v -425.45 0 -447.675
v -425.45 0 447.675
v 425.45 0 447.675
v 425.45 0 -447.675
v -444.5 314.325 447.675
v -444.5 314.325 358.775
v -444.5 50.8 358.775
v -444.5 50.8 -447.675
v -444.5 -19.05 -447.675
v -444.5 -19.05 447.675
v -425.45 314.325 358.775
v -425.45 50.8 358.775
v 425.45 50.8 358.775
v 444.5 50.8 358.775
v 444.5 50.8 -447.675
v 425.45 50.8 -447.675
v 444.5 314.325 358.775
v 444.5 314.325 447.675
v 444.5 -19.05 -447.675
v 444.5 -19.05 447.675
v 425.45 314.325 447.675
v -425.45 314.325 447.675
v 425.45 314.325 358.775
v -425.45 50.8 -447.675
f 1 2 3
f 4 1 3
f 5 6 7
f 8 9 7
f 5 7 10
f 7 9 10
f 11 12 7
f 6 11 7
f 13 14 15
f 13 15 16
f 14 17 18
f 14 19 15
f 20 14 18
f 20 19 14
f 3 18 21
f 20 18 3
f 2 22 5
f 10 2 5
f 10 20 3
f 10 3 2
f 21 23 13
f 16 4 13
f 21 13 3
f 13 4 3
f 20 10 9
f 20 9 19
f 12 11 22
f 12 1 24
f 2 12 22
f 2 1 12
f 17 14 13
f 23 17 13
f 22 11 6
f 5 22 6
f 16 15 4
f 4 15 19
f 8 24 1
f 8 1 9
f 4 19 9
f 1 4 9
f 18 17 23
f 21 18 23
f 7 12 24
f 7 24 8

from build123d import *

# Parameters (mm, degrees)
F0_W     = 889
F0_H     = 895.35
F1_DEPTH = 19.05
F2_W     = 19.05
F2_H     = 895.35
F3_DEPTH = 50.8
F4_W     = 19.05
F4_H     = 88.9
F5_DEPTH = 263.525
F6_W     = 19.05
F6_H     = 88.9
F7_DEPTH = 263.525


with BuildPart() as f1:
    # F0 (on Front) → F1 (new body)
    with BuildSketch(Plane.XZ):
        Rectangle(F0_W, F0_H)
    extrude(amount=F1_DEPTH)

    # F2 (on face) → F3 (join)
    with BuildSketch(Plane(origin=(0, 0, 0), x_dir=(-1, 0, 0), z_dir=(0, 1, 0))):
        with Locations((-434.975, 0)):
            Rectangle(F2_W, F2_H)
        with Locations((434.975, 0)):
            Rectangle(F2_W, F2_H)
    extrude(amount=F3_DEPTH)

    # F4 (on face) → F5 (join)
    with BuildSketch(Plane(origin=(0, 50.8, 0), x_dir=(-1, 0, 0), z_dir=(0, 1, 0))):
        with Locations((-434.975, 403.225)):
            Rectangle(F4_W, F4_H)
    extrude(amount=F5_DEPTH)

    # F6 (on face) → F7 (join)
    with BuildSketch(Plane(origin=(0, 50.8, 0), x_dir=(-1, 0, 0), z_dir=(0, 1, 0))):
        with Locations((434.975, 403.225)):
            Rectangle(F6_W, F6_H)
    extrude(amount=F7_DEPTH)


solid = f1.part
